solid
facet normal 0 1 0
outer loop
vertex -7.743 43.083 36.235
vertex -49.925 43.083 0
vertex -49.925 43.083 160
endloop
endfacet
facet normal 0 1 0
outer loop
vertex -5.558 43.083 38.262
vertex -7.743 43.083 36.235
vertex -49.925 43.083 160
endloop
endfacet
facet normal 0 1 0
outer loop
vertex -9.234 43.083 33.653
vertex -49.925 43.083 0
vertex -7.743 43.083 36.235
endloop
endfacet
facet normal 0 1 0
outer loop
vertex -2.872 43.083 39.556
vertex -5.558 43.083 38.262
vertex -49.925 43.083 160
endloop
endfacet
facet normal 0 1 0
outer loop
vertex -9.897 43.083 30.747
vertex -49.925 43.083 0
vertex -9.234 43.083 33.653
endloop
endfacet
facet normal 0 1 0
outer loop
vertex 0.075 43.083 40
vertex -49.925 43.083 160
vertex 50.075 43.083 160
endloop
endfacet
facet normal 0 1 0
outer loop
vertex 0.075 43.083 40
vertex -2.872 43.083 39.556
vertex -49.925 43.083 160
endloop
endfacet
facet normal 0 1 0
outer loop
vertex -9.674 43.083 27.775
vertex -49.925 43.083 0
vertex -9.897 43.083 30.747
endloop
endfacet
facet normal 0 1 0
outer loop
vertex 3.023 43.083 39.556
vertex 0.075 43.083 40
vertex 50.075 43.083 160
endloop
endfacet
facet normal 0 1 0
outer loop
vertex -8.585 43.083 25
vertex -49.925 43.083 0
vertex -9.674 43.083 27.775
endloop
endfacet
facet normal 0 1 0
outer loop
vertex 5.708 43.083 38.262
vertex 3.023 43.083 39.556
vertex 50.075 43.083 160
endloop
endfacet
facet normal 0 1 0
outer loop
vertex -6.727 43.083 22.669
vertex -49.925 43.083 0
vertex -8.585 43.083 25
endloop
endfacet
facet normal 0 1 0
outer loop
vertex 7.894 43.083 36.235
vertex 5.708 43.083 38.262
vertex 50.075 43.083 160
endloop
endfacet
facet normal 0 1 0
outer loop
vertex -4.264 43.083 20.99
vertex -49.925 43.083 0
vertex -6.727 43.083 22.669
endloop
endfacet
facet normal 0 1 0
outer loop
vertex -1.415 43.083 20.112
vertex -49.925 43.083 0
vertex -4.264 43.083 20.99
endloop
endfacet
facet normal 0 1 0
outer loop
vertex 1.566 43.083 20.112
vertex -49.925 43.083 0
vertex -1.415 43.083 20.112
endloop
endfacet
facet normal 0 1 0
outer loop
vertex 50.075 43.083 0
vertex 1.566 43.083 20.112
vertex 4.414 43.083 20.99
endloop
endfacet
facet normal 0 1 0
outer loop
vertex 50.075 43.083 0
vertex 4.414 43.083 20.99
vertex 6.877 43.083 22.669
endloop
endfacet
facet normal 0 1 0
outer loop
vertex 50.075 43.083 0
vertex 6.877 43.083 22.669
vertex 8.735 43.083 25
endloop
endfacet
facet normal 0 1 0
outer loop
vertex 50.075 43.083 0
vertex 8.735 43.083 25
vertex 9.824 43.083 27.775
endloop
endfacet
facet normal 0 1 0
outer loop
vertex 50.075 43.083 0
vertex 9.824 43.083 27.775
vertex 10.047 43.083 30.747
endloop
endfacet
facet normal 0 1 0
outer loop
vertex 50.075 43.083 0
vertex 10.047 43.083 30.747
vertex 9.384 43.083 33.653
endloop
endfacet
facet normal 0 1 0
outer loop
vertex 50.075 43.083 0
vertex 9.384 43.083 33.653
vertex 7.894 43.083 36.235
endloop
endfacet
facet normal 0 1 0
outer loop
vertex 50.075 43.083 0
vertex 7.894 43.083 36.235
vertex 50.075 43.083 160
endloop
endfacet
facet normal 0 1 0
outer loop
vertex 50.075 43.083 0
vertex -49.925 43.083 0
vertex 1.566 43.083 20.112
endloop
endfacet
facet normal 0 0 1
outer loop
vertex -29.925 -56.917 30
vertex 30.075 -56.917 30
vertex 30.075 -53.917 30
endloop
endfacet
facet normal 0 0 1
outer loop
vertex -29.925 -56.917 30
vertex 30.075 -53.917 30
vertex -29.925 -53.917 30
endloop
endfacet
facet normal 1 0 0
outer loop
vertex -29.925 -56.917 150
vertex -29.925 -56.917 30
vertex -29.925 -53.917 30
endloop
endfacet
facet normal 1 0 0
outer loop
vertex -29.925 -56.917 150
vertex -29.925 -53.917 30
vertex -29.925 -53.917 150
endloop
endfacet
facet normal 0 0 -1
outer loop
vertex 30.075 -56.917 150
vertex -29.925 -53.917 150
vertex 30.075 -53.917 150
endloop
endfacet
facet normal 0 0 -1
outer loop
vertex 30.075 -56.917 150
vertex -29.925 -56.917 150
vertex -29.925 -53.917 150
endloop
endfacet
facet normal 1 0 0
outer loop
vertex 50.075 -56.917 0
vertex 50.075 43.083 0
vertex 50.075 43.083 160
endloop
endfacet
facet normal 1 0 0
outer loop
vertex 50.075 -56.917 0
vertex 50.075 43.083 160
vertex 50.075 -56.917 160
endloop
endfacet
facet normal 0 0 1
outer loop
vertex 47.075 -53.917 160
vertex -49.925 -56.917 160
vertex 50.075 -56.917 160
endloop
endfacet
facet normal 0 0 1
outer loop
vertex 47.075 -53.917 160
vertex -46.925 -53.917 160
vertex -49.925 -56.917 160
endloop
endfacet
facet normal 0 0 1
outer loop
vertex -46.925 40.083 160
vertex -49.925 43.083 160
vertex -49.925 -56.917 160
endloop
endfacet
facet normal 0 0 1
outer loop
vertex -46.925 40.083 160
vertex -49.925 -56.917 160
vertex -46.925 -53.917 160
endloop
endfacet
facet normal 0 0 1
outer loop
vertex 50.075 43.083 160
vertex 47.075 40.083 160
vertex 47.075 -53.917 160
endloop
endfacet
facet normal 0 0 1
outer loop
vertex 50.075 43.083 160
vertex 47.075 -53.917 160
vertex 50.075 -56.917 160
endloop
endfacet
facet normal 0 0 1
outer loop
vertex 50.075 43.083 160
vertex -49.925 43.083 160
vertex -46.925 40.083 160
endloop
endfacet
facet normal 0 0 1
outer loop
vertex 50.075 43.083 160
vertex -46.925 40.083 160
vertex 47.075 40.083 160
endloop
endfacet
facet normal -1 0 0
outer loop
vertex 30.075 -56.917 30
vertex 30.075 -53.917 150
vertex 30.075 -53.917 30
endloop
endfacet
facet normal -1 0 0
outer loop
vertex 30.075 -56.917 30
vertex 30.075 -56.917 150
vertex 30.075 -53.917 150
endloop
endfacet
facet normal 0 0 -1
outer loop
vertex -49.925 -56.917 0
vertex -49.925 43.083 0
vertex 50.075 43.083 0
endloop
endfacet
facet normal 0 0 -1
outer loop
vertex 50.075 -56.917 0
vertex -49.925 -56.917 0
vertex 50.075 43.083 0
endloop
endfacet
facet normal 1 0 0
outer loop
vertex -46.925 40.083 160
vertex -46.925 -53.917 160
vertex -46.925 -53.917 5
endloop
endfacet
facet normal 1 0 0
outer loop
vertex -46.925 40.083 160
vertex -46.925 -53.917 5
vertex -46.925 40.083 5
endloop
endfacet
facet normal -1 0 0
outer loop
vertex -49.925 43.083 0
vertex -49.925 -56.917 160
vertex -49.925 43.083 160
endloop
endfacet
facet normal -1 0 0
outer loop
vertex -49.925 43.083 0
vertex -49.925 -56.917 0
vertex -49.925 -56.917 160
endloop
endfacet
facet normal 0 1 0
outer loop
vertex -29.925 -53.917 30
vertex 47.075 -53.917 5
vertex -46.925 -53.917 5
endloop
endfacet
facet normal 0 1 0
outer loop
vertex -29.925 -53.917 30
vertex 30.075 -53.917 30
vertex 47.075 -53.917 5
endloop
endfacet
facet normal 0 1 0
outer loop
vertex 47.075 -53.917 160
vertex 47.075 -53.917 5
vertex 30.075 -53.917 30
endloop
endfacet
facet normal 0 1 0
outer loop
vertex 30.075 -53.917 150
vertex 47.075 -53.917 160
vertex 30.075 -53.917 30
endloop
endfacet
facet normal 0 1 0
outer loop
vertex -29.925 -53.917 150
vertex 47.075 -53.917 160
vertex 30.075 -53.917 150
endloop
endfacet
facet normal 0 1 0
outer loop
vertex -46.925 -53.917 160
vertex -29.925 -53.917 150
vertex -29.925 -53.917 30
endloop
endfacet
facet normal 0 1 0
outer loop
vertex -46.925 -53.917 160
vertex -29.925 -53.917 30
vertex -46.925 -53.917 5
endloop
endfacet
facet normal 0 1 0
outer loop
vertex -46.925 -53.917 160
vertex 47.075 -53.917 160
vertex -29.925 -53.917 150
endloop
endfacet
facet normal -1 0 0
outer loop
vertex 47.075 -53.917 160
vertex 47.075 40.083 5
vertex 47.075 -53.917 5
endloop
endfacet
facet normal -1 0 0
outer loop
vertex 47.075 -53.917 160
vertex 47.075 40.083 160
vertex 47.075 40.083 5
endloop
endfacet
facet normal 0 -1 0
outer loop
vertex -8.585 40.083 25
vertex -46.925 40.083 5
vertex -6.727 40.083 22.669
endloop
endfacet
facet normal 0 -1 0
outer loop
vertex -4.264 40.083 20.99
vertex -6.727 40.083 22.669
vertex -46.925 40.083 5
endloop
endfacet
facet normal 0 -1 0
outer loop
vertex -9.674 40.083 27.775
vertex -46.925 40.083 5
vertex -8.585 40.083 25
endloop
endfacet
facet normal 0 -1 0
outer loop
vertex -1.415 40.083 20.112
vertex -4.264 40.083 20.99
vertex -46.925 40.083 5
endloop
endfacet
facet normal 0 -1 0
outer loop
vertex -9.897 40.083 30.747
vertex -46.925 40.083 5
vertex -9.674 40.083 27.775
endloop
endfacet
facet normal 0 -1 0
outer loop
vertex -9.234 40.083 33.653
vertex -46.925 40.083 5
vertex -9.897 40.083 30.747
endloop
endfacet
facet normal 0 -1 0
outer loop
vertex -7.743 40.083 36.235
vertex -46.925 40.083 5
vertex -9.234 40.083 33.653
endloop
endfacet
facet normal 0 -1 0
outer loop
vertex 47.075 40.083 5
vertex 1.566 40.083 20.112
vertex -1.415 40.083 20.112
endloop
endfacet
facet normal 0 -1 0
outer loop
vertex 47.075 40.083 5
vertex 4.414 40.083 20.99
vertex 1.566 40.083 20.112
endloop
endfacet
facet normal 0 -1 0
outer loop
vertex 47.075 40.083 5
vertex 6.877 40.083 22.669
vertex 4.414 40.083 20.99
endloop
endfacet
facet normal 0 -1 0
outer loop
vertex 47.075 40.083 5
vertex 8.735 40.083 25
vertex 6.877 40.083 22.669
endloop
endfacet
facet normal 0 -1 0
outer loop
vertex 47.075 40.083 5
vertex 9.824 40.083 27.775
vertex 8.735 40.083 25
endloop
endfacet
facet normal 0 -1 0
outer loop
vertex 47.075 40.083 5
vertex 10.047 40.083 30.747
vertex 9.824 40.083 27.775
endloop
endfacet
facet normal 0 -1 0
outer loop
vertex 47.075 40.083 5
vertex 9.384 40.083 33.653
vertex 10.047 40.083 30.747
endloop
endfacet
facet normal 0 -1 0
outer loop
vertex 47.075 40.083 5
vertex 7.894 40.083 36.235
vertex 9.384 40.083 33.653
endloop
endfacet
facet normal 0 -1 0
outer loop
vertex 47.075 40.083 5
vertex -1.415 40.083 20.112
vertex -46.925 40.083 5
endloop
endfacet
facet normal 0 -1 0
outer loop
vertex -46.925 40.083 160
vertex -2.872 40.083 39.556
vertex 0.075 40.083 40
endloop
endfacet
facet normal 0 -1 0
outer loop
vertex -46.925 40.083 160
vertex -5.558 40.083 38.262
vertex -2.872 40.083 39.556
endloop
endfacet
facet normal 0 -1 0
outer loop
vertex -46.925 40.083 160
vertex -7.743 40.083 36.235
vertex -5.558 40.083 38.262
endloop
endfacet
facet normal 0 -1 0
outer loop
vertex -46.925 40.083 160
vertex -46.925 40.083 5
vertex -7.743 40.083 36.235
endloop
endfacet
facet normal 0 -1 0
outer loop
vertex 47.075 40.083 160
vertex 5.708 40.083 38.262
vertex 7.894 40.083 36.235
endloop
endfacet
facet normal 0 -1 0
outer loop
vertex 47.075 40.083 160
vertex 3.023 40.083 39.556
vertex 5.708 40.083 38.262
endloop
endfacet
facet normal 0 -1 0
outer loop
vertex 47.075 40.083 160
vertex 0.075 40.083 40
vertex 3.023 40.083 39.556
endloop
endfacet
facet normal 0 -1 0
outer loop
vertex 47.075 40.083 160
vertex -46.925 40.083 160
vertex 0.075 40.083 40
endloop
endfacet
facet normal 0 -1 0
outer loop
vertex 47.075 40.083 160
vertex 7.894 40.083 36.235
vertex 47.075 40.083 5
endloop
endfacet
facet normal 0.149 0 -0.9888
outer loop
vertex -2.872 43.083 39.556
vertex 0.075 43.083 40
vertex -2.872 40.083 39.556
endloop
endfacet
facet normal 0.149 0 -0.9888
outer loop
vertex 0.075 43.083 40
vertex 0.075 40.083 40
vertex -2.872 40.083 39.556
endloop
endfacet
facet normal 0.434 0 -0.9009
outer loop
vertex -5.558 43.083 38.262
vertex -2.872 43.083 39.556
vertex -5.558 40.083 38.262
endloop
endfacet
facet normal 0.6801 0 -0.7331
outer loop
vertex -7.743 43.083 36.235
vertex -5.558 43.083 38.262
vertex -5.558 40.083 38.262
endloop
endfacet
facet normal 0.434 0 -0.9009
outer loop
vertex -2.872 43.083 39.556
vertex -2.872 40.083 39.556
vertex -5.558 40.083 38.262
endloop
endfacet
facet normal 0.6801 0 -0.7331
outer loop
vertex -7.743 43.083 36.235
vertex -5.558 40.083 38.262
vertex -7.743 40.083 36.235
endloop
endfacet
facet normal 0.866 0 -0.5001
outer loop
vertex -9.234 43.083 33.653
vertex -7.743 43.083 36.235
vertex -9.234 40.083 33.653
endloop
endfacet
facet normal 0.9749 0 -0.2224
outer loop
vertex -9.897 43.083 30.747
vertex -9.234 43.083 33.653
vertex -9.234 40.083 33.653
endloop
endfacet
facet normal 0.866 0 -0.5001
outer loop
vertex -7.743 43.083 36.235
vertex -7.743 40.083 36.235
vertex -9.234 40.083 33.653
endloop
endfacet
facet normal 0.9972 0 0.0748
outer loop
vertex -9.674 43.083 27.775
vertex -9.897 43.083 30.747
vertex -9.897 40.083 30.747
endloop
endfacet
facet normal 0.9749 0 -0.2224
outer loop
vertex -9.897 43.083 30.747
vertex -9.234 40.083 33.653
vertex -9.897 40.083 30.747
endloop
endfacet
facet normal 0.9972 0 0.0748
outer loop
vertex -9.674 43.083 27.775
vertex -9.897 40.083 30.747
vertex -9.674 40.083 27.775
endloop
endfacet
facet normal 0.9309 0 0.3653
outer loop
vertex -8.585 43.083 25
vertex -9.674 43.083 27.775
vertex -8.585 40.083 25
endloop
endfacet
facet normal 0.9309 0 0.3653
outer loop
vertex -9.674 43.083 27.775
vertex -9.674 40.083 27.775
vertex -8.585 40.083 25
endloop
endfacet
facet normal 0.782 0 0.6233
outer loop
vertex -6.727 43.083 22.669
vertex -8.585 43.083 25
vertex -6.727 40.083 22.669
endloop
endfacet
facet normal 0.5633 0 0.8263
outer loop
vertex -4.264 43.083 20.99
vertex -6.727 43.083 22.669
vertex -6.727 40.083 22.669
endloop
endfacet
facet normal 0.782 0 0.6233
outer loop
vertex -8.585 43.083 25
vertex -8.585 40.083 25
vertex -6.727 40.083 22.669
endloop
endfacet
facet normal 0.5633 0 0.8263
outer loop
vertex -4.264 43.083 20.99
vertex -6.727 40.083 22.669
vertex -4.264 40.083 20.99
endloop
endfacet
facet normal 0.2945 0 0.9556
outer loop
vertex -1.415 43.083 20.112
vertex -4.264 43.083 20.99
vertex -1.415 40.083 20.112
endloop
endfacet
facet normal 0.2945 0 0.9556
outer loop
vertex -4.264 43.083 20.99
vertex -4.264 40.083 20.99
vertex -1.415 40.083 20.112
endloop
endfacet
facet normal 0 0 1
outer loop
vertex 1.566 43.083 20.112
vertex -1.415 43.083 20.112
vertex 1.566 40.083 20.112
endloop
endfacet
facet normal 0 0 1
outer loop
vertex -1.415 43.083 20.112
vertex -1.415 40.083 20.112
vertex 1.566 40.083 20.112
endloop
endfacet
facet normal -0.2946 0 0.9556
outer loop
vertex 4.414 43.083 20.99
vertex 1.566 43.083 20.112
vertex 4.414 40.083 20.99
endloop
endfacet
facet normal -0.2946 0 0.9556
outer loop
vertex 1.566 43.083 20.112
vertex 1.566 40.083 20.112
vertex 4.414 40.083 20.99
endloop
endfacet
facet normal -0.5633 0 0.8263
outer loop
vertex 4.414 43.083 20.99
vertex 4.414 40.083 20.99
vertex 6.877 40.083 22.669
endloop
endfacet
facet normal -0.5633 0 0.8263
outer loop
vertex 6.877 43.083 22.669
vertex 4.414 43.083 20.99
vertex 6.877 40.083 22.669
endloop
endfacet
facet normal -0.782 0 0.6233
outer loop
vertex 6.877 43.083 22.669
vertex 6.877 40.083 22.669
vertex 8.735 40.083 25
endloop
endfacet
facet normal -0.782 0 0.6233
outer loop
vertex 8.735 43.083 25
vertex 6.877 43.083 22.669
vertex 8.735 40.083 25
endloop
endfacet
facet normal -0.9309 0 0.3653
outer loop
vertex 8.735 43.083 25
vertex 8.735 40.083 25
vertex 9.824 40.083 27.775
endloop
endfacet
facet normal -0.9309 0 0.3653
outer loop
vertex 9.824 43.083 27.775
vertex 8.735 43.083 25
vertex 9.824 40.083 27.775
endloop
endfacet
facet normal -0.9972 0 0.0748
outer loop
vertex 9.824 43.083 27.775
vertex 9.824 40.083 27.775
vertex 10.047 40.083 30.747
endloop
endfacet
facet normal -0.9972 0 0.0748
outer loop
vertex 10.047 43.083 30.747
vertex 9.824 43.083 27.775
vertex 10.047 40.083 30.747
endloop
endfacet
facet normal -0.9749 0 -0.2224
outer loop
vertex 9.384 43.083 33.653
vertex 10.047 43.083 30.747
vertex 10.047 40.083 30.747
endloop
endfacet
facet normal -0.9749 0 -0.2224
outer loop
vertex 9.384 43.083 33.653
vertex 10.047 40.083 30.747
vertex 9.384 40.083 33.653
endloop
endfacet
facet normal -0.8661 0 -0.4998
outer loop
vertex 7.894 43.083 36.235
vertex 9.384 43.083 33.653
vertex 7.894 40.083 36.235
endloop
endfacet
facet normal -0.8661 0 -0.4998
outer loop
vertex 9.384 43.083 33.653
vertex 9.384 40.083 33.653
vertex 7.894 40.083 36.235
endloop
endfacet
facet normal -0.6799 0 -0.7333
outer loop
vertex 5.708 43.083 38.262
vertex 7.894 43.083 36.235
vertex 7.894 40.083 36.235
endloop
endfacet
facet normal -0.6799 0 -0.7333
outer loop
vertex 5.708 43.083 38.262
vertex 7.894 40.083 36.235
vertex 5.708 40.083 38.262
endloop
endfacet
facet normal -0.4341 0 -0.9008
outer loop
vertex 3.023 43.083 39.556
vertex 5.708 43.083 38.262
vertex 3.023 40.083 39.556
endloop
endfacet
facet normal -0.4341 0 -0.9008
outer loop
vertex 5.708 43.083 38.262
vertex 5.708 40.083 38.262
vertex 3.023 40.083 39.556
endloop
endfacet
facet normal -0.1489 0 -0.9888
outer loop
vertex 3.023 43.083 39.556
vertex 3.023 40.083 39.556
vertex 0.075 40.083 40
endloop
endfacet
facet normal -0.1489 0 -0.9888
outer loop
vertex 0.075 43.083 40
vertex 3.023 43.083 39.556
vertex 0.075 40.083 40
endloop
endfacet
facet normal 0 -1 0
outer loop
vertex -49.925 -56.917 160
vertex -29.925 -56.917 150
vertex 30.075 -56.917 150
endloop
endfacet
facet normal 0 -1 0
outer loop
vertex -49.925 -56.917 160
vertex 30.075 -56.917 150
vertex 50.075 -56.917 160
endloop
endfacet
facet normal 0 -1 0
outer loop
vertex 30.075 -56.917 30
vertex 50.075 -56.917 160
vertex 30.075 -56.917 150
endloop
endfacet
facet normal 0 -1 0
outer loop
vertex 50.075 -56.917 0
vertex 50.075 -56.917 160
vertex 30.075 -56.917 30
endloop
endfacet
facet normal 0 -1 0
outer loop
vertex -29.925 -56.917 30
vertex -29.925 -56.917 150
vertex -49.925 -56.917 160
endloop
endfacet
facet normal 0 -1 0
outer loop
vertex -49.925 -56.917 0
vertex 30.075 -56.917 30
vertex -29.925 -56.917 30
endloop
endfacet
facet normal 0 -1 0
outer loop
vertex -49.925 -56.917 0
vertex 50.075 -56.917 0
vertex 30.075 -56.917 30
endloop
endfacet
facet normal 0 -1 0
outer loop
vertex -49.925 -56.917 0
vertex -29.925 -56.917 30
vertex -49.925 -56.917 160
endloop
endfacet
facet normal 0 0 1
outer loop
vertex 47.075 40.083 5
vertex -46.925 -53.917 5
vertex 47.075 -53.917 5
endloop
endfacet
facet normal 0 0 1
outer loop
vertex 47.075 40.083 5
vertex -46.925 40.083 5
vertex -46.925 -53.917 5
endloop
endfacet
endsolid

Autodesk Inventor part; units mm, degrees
ref_plane "YZ Plane" through (0, 0, 0) normal (1, 0, 0) x (0, 1, 0)
ref_plane "XZ Plane" through (0, 0, 0) normal (0, 1, 0) x (-1, 0, 0)
ref_plane "XY Plane" through (0, 0, 0) normal (0, 0, 1) x (1, 0, 0)
sketch "Esquisse2" plane through (0, 0, 0) normal (0, 0, 1) x (1, 0, 0)
  line L0 (-49.9248, 43.0827) -> (50.0752, 43.0827)
  line L1 (50.0752, 43.0827) -> (50.0752, -56.9173)
  line L2 (50.0752, -56.9173) -> (-49.9248, -56.9173)
  line L3 (-49.9248, -56.9173) -> (-49.9248, 43.0827)
  point P0 (0, 0)
  dimension "d0" = 100
  dimension "d1" = 100
extrude "Extrusion1" add sketch "Esquisse2" along normal blind 160
sketch "Esquisse3" plane through (0, 0, 160) normal (0, 0, 1) x (1, 0, 0)
  line L0 (-46.9248, 40.0827) -> (47.0752, 40.0827)
  line L1 (47.0752, 40.0827) -> (47.0752, -53.9173)
  line L2 (47.0752, -53.9173) -> (-46.9248, -53.9173)
  line L3 (-46.9248, -53.9173) -> (-46.9248, 40.0827)
  line L4 (50.0752, 43.0827) -> (-49.9248, 43.0827) projected
  line L5 (50.0752, -56.9173) -> (50.0752, 43.0827) projected
  line L6 (-49.9248, -56.9173) -> (50.0752, -56.9173) projected
  line L7 (-49.9248, 43.0827) -> (-49.9248, -56.9173) projected
  point P0 (0, 0)
  dimension "d4" = 3
  dimension "d5" = 3
  dimension "d6" = 3
  dimension "d7" = 3
extrude "Extrusion2" cut sketch "Esquisse3" against normal blind 155 contours L0 L1 L2 L3
sketch "Esquisse4" plane through (-49.9248, 43.0827, 0) normal (0, 1, 0) x (1, 0, 0)
  circle A0 centre (50, -30) radius 9.7582
  line L0 (100, 0) -> (100, -160) projected
  line L1 (100, 0) -> (0, 0) projected
  point P0 (49.9248, 0)
  dimension "d10" = 50
  dimension "d11" = 30
hole "Perçage1" at (0.0752, 43.0827, 30) direction (0, -1, 0) diameter 20 depth 8 tip angle 118
sketch "Esquisse5" plane through (-49.9248, -56.9173, 0) normal (0, -1, 0) x (1, 0, 0)
  line L0 (20, 150) -> (80, 150)
  line L1 (80, 150) -> (80, 30)
  line L2 (80, 30) -> (20, 30)
  line L3 (20, 30) -> (20, 150)
  line L4 (0, 0) -> (100, 0) projected
  line L5 (100, 0) -> (100, 160) projected
  point P0 (49.9248, 0)
  dimension "d19" = 60
  dimension "d20" = 120
  dimension "d21" = 30
  dimension "d22" = 20
extrude "Extrusion3" cut sketch "Esquisse5" against normal blind 5
properties part number "bloc station"
